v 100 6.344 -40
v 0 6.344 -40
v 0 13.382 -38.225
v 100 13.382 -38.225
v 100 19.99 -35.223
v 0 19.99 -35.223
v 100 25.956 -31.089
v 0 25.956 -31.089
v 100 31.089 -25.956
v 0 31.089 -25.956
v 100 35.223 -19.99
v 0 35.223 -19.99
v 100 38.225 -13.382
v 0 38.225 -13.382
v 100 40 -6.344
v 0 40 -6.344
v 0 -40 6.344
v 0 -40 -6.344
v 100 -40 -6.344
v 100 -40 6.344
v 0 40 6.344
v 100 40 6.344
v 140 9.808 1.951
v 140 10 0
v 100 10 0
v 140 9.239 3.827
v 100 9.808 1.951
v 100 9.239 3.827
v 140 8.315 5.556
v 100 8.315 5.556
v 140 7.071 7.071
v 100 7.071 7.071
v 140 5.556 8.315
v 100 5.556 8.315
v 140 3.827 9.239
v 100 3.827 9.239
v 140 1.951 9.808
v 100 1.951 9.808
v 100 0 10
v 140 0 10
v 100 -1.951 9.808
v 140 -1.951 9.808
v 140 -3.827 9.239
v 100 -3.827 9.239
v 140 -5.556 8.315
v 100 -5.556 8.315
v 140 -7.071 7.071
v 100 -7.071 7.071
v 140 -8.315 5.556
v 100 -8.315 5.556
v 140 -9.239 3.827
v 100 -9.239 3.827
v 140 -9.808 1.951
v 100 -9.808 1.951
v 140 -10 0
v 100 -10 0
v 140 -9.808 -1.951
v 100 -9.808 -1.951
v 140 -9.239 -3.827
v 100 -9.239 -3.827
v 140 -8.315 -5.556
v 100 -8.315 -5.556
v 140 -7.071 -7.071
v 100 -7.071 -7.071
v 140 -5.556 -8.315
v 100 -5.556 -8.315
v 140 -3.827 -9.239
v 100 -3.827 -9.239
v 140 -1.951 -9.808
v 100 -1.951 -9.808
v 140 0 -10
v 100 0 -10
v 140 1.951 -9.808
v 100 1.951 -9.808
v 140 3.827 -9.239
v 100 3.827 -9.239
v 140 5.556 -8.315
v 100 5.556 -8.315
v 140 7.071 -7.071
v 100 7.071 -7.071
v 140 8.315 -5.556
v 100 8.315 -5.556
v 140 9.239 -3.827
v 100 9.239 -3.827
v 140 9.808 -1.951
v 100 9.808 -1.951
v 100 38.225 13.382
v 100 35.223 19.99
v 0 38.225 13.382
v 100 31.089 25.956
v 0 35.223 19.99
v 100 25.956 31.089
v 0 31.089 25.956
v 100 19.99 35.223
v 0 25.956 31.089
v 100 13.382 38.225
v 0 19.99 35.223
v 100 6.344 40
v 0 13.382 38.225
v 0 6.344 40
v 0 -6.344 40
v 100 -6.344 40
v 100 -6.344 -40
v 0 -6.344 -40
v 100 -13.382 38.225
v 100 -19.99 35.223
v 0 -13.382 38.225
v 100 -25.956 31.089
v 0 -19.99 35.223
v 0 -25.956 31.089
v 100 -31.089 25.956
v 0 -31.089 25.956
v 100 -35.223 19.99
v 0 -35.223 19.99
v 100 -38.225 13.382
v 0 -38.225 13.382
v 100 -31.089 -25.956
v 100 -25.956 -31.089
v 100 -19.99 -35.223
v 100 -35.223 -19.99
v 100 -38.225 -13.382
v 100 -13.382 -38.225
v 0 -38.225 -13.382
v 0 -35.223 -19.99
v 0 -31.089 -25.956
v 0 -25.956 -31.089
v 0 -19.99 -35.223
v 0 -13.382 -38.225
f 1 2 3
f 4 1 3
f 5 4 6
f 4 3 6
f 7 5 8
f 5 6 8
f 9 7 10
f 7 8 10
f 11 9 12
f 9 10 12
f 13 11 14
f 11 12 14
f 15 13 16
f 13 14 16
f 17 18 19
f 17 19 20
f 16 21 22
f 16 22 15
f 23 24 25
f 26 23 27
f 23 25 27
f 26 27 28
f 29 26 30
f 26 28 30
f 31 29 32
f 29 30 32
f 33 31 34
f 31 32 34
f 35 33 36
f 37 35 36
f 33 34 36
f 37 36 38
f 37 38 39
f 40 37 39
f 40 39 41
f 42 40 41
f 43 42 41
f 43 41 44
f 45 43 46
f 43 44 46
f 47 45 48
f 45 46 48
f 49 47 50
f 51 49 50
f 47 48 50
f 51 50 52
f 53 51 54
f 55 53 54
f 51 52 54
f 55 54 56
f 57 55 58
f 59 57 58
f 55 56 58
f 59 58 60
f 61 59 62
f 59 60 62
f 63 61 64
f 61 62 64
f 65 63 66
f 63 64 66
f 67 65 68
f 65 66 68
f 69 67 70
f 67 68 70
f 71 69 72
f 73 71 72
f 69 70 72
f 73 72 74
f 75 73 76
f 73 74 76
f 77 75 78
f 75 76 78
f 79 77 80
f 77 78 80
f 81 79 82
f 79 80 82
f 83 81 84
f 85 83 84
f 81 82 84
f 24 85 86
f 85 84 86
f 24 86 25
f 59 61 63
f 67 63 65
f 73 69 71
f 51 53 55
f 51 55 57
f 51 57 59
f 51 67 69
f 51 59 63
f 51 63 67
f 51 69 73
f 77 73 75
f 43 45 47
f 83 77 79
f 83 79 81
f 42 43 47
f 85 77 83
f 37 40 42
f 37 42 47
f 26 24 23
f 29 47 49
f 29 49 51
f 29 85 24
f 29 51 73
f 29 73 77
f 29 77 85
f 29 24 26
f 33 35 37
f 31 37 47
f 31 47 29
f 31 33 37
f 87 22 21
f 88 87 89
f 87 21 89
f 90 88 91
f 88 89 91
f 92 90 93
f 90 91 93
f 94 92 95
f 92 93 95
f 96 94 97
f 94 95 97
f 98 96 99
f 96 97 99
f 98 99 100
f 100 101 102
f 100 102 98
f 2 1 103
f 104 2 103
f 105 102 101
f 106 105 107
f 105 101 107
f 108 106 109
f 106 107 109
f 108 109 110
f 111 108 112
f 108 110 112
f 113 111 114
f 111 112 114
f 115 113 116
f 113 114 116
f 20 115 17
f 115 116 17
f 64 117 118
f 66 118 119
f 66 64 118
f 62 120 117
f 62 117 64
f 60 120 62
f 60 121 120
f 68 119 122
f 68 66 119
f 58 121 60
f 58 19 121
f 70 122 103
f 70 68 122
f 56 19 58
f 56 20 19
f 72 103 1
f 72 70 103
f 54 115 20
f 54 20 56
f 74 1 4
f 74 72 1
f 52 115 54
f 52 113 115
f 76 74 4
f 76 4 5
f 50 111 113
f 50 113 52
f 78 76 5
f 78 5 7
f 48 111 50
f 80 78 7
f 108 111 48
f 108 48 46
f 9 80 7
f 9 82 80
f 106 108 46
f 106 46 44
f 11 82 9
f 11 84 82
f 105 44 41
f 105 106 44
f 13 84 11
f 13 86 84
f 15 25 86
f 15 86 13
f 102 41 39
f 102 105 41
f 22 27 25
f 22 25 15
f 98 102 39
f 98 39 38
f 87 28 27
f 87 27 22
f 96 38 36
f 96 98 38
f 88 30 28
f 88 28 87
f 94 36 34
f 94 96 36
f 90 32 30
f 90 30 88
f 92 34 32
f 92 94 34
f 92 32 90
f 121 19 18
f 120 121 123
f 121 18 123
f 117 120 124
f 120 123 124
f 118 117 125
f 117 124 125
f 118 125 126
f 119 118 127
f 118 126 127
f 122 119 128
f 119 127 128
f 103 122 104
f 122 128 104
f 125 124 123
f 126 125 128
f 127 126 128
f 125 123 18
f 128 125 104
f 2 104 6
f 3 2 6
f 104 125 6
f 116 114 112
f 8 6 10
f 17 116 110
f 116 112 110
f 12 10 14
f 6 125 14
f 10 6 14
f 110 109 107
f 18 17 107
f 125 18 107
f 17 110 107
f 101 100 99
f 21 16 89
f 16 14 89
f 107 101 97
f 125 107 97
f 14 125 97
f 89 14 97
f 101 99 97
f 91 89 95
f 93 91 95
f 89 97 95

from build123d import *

# Parameters (mm, degrees)
F0_R     = 40.5
F1_DEPTH = 100
F2_W     = 90
F2_H     = 90
F3_DEPTH = 100.001
F4_R     = 10
F5_DEPTH = 40


with BuildPart() as f1:
    # F0 (on Right) → F1 (new body)
    with BuildSketch(Plane.YZ):
        Circle(F0_R)
    extrude(amount=F1_DEPTH)

    # F2 (on face) → F3 (cut, through all)
    with BuildSketch(Plane.YZ.offset(100)):
        Rectangle(F2_W, F2_H)
        with BuildLine():
            Line((40, -6.3442887702), (40, -40))
            Line((40, -40), (6.3442887702, -40))
            ThreePointArc((6.3442887702, -40), (0, -40.5), (-6.3442887702, -40))
            Line((-6.3442887702, -40), (-40, -40))
            Line((-40, -40), (-40, -6.3442887702))
            ThreePointArc((-40, -6.3442887702), (-40.5, 0), (-40, 6.3442887702))
            Line((-40, 6.3442887702), (-40, 40))
            Line((-40, 40), (-6.3442887702, 40))
            ThreePointArc((-6.3442887702, 40), (0, 40.5), (6.3442887702, 40))
            Line((6.3442887702, 40), (40, 40))
            Line((40, 40), (40, 6.3442887702))
            ThreePointArc((40, 6.3442887702), (40.3748065011, 3.1819805153), (40.5, 0))
            ThreePointArc((40.5, 0), (40.3748065011, -3.1819805153), (40, -6.3442887702))
        make_face(mode=Mode.SUBTRACT)
        with BuildLine():
            ThreePointArc((-6.3442887702, -40), (0, -40.5), (6.3442887702, -40))
            Line((6.3442887702, -40), (-6.3442887702, -40))
        make_face()
        with BuildLine():
            Line((40, 6.3442887702), (40, -6.3442887702))
            ThreePointArc((40, -6.3442887702), (40.3748065011, -3.1819805153), (40.5, 0))
            ThreePointArc((40.5, 0), (40.3748065011, 3.1819805153), (40, 6.3442887702))
        make_face()
        with BuildLine():
            ThreePointArc((-40, 6.3442887702), (-40.5, 0), (-40, -6.3442887702))
            Line((-40, -6.3442887702), (-40, 6.3442887702))
        make_face()
        with BuildLine():
            Line((-6.3442887702, 40), (6.3442887702, 40))
            ThreePointArc((6.3442887702, 40), (0, 40.5), (-6.3442887702, 40))
        make_face()
    extrude(amount=-F3_DEPTH, mode=Mode.SUBTRACT)

    # F4 (on face) → F5 (join)
    with BuildSketch(Plane.YZ.offset(100)):
        Circle(F4_R)
    extrude(amount=F5_DEPTH)


solid = f1.part
